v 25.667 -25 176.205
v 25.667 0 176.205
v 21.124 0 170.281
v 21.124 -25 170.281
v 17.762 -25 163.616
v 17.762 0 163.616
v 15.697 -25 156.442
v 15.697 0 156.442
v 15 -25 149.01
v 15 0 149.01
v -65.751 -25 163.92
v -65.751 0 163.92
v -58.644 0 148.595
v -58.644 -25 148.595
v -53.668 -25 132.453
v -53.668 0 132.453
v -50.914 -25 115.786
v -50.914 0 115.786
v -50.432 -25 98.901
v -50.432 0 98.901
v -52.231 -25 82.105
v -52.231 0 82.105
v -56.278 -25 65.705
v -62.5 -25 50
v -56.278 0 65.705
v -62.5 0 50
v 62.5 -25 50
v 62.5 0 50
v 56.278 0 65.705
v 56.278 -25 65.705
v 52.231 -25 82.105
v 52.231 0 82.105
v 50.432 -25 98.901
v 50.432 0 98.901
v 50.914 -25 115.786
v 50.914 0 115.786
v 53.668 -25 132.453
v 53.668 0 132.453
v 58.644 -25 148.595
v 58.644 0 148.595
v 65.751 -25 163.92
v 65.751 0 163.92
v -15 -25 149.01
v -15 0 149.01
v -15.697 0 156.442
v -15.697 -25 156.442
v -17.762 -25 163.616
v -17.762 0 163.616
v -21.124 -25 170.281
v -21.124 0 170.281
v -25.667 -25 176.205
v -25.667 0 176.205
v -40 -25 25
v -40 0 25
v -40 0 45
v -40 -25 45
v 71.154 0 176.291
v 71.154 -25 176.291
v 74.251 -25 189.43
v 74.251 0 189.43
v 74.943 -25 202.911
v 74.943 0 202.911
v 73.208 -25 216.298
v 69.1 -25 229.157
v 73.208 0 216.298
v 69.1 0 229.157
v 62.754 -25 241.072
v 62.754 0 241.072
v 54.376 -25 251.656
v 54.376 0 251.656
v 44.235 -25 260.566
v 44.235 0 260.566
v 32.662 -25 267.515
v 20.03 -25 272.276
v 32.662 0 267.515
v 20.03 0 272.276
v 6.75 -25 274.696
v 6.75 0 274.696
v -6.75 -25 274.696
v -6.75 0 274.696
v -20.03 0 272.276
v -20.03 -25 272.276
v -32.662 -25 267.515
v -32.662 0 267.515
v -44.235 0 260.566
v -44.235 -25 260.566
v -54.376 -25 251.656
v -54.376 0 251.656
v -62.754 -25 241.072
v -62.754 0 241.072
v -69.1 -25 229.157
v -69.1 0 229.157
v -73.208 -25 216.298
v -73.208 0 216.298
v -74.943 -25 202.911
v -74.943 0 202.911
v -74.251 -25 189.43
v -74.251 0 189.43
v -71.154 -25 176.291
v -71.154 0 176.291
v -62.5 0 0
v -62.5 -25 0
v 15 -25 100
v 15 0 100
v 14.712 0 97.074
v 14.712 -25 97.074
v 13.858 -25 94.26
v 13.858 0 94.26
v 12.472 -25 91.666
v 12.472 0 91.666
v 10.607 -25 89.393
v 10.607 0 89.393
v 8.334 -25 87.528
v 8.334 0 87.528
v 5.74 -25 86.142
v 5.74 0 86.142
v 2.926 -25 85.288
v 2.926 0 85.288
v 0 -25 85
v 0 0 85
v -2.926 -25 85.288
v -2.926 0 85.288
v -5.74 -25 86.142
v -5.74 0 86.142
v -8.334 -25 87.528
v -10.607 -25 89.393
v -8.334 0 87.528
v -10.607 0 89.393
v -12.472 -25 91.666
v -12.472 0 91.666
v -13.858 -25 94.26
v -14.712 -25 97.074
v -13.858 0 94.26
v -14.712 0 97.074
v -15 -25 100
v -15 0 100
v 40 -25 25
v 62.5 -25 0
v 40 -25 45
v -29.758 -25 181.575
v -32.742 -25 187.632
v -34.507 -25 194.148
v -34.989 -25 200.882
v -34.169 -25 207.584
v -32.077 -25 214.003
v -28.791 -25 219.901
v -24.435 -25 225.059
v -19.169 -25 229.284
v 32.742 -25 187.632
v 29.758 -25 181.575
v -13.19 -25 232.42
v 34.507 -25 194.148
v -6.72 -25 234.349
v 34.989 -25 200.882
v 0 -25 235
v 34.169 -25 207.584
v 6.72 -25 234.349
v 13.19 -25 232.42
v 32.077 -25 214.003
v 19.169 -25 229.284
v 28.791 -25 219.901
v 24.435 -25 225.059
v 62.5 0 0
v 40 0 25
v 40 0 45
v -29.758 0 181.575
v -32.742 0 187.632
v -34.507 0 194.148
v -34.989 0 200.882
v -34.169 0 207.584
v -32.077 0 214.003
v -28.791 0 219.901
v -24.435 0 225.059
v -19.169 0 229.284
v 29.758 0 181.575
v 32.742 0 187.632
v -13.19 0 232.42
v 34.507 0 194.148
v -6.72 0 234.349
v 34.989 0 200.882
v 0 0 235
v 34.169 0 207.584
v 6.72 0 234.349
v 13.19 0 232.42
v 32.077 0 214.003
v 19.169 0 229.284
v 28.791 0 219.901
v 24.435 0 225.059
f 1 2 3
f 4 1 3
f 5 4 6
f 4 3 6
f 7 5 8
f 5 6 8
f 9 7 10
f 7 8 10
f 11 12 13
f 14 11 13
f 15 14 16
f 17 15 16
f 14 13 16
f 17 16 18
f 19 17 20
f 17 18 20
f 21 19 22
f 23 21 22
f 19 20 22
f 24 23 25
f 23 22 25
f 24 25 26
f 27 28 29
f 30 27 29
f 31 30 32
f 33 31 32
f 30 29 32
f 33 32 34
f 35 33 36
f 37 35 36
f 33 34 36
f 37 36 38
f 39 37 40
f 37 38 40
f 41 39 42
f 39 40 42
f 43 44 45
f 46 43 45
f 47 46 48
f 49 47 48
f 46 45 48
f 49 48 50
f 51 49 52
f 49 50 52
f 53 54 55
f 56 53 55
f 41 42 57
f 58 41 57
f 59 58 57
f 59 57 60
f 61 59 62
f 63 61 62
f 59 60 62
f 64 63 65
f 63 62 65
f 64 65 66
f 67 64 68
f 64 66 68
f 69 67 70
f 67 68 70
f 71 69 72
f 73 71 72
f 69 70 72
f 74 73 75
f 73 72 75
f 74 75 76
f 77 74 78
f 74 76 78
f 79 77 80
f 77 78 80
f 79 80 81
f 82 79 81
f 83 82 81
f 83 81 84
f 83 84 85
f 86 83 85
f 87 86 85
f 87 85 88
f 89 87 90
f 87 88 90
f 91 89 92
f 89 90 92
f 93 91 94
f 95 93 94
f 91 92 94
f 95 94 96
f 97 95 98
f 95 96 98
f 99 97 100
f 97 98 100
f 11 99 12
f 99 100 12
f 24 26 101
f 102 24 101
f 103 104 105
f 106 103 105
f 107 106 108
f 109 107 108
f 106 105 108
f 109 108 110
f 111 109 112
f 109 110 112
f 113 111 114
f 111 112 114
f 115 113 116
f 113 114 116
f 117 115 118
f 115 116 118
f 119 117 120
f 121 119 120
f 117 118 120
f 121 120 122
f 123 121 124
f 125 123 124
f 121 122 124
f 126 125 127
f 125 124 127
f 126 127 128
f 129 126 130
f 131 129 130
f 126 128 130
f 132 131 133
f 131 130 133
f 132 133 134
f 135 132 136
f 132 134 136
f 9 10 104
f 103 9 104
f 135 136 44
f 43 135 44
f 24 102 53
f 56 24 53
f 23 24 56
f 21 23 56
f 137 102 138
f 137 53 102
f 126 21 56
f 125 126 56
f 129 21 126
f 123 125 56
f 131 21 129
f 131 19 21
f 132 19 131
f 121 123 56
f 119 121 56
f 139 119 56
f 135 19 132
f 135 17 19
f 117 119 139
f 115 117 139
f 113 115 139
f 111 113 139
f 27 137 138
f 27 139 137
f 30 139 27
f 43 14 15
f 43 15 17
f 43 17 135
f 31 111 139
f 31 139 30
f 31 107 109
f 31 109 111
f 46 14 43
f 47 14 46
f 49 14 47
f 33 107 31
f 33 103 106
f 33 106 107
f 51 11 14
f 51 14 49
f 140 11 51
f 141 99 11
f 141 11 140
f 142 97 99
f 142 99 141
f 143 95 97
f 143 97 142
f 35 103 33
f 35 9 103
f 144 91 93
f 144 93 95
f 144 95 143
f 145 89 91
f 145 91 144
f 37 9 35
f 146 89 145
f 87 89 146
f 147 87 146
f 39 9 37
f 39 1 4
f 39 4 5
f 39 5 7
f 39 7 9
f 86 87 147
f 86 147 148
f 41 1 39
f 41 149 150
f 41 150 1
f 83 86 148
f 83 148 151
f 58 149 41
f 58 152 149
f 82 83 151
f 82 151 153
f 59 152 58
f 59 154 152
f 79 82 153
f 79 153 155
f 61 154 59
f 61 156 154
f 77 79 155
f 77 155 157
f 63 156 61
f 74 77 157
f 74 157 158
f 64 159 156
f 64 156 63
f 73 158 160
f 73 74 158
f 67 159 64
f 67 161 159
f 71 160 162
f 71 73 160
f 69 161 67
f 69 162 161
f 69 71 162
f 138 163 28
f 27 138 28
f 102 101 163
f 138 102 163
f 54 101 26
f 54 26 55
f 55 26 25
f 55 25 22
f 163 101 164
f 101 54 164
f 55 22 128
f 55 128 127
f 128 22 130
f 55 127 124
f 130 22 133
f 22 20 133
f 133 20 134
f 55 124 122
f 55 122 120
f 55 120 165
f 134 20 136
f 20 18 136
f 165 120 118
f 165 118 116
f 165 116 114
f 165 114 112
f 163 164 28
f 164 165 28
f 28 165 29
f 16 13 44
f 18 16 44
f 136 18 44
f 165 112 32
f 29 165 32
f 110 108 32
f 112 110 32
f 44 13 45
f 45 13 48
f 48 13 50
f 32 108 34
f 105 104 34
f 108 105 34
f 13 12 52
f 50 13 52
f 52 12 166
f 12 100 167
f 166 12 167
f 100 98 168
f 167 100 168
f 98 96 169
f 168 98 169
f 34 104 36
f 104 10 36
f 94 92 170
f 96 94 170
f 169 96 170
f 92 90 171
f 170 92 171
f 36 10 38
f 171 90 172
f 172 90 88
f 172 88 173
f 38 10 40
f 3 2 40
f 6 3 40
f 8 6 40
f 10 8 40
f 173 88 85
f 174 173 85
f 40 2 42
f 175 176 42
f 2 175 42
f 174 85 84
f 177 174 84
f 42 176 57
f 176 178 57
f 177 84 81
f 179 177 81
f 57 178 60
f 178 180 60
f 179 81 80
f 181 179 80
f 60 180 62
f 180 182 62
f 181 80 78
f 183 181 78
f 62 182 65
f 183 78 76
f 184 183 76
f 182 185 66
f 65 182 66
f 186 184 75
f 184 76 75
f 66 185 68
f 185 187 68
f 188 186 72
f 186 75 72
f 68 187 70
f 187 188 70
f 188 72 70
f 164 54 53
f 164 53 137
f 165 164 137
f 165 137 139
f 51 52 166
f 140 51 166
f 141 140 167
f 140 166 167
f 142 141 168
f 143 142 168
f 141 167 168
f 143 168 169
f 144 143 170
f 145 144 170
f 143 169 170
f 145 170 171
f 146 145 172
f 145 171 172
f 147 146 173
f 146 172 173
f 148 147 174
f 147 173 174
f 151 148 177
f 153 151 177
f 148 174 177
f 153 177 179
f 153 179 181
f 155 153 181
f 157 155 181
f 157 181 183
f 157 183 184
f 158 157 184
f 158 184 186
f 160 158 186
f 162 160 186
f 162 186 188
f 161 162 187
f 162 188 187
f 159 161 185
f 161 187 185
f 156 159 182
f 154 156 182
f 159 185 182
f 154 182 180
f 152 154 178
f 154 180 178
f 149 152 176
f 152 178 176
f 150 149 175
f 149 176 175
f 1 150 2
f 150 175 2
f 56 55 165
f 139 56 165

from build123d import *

# Parameters (mm, degrees)
F0_W     = 80
F0_H     = 20
F1_DEPTH = 25


with BuildPart() as f1:
    # F0 (on Front) → F1 (new body)
    with BuildSketch(Plane.XZ):
        with BuildLine():
            Line((-62.5, 0), (0, 0))
            Line((0, 0), (62.5, 0))
            Line((62.5, 0), (62.5, 50))
            ThreePointArc((62.5, 50), (50.387322, 107.351956), (65.751168, 163.919758))
            ThreePointArc((65.751168, 163.919758), (0, 275), (-65.751168, 163.919758))
            ThreePointArc((-65.751168, 163.919758), (-50.387322, 107.351956), (-62.5, 50))
            Line((-62.5, 50), (-62.5, 0))
        make_face()
        with Locations((0, 35)):
            Rectangle(F0_W, F0_H, mode=Mode.SUBTRACT)
        with BuildLine():
            ThreePointArc((-25.666667, 176.204576), (0, 235), (25.666667, 176.204576))
            ThreePointArc((25.666667, 176.204576), (17.762027, 163.61574), (15, 149.009805))
            Line((15, 149.009805), (15, 100))
            ThreePointArc((15, 100), (0, 85), (-15, 100))
            Line((-15, 100), (-15, 149.009805))
            ThreePointArc((-15, 149.009805), (-17.762027, 163.61574), (-25.666667, 176.204576))
        make_face(mode=Mode.SUBTRACT)
    extrude(amount=F1_DEPTH)


solid = f1.part
